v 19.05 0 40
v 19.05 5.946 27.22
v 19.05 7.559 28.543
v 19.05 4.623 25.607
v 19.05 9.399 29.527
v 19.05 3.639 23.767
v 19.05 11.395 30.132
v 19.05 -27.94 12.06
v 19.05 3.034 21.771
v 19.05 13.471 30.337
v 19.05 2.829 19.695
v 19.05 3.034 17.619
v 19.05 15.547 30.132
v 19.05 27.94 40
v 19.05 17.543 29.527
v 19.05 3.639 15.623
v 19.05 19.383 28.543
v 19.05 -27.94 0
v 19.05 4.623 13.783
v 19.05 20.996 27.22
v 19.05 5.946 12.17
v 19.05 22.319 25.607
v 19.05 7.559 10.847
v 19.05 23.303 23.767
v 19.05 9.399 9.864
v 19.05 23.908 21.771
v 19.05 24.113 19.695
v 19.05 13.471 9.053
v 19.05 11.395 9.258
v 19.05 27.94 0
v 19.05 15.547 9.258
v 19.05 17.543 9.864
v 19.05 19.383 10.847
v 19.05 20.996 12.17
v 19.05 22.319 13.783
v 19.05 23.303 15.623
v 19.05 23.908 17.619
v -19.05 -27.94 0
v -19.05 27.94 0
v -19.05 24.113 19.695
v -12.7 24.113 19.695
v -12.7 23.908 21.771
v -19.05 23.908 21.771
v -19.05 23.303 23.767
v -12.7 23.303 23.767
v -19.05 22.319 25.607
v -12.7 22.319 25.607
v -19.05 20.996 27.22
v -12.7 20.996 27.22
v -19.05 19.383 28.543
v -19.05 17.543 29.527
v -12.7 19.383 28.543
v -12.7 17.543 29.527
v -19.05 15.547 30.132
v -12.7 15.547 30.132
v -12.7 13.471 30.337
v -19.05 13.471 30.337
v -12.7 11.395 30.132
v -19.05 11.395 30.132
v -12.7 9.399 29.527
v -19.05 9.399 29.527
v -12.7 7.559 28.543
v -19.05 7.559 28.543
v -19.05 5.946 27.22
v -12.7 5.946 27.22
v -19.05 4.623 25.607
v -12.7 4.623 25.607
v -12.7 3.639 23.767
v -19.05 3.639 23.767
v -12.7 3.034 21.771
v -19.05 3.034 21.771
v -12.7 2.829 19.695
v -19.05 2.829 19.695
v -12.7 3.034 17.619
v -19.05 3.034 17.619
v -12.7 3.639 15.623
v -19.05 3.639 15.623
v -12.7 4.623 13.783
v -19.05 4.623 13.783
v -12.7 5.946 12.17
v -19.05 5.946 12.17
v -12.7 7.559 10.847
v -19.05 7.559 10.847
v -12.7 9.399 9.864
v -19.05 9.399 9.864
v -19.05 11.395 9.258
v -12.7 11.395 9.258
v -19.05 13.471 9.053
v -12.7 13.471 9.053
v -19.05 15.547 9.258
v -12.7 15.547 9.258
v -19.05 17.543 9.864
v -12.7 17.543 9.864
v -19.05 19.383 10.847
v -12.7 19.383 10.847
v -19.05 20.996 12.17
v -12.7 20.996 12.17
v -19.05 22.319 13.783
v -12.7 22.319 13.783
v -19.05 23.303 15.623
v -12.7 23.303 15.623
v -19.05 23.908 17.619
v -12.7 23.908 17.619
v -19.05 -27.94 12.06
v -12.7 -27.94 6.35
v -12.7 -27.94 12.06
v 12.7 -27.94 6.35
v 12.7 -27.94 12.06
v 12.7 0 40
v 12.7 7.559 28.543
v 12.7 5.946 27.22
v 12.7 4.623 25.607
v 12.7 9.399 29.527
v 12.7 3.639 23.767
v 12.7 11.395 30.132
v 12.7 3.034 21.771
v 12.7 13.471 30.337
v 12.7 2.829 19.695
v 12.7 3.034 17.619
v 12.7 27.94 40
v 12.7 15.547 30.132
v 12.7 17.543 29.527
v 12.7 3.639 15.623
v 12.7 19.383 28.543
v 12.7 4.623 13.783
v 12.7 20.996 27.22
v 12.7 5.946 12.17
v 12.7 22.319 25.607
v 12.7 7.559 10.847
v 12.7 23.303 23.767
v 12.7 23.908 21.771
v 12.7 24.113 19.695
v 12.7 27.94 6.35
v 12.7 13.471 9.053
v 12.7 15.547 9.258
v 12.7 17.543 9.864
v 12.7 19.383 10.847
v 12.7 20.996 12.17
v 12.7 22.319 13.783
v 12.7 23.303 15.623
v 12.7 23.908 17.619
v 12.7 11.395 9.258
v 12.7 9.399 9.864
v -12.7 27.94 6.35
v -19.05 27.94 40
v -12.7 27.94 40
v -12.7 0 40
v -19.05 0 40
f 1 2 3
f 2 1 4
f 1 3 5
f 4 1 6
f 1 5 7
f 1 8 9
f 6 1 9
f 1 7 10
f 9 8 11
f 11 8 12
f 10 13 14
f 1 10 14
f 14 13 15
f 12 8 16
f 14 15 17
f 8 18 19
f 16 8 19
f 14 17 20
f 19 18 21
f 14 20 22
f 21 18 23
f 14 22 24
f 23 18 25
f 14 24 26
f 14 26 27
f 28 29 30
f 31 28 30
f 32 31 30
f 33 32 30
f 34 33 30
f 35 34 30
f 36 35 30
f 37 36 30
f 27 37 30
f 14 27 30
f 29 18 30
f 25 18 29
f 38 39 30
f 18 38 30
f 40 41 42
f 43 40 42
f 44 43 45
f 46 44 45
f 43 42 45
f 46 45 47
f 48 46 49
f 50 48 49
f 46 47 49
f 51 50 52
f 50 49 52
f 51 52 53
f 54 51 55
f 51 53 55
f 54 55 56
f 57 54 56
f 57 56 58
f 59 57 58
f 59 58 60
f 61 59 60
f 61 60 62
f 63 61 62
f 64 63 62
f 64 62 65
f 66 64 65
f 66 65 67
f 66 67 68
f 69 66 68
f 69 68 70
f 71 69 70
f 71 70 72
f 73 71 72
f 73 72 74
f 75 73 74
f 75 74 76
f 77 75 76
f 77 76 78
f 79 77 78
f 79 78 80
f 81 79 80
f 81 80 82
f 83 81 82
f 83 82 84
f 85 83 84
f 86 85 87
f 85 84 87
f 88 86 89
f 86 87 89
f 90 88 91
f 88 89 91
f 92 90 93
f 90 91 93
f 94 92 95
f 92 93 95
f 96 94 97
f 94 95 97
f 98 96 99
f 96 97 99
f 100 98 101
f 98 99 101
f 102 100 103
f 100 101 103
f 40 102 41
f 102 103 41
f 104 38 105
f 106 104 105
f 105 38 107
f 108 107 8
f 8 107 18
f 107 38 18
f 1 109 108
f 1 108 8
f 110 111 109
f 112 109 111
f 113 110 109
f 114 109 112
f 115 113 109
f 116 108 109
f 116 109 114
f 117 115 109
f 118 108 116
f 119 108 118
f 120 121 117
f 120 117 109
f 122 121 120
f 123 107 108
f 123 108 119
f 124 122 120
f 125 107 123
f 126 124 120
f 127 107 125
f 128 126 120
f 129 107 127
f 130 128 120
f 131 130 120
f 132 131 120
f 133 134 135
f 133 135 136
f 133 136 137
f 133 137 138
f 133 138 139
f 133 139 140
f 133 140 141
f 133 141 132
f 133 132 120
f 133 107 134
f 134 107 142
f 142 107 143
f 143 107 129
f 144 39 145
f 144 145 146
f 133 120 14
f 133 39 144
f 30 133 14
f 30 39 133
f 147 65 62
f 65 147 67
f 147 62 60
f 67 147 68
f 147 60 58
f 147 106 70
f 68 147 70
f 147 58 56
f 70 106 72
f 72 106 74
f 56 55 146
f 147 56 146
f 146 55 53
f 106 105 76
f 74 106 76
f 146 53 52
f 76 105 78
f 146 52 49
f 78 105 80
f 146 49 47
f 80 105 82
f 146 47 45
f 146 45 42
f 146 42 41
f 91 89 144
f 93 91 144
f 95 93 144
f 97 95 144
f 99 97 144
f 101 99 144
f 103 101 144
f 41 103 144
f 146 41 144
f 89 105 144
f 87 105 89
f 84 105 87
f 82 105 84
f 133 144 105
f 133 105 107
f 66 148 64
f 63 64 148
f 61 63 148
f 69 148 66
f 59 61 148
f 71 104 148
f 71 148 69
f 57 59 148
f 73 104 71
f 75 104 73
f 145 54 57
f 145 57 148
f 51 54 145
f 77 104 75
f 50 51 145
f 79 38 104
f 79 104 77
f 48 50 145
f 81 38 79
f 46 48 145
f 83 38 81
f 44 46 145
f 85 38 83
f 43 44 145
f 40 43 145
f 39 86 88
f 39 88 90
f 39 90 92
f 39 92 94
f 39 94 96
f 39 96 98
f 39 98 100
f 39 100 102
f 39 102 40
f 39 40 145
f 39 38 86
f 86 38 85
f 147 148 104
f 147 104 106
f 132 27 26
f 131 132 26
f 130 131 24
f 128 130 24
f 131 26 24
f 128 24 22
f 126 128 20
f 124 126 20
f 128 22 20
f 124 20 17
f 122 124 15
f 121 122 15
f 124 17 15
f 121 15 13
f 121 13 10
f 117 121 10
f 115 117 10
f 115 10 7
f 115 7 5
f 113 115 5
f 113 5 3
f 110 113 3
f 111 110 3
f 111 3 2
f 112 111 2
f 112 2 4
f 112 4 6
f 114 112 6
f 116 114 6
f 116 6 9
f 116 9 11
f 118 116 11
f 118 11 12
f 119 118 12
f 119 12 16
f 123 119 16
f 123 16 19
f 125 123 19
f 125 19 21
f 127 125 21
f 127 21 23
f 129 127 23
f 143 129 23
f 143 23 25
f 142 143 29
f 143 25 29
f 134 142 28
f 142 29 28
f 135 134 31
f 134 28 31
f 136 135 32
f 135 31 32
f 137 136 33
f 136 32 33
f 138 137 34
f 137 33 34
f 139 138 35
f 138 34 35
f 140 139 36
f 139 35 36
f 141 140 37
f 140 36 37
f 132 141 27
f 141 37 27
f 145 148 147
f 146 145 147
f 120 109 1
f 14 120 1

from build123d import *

# Parameters (mm, degrees)
F1_DEPTH = 6.35
F2_W     = 6.35
F2_H     = 55.88
F3_DEPTH = 33.64992
F4_SIZE  = 27.94
F5_R     = 10.64163
F6_DEPTH = 38.101


with BuildPart() as f1:
    # F0 (on Top) → F1 (new body)
    with BuildSketch(Plane.XY):
        Polygon((19.05, 27.94), (0, 27.94), (-19.05, 27.94), (-19.05, 0), (-19.05, -27.94), (0, -27.94), (19.05, -27.94), (19.05, 0), align=None)
    extrude(amount=F1_DEPTH)

    # F2 (on face) → F3 (join)
    with BuildSketch(Plane.XY.offset(6.35)):
        with Locations((-15.875, 0)):
            Rectangle(F2_W, F2_H)
        with Locations((15.875, 0)):
            Rectangle(F2_W, F2_H)
    extrude(amount=F3_DEPTH)

    # F4
    f4_edges = [f1.edges().sort_by_distance(p)[0] for p in [
        (15.875, -27.94, 39.99992),
        (-15.875, -27.94, 39.99992),
    ]]
    chamfer(f4_edges, length=F4_SIZE)

    # F5 (on face) → F6 (cut, through all)
    with BuildSketch(Plane.YZ.offset(19.05)):
        with Locations((13.47094, 19.69512)):
            Circle(F5_R)
    extrude(amount=-F6_DEPTH, mode=Mode.SUBTRACT)


solid = f1.part
